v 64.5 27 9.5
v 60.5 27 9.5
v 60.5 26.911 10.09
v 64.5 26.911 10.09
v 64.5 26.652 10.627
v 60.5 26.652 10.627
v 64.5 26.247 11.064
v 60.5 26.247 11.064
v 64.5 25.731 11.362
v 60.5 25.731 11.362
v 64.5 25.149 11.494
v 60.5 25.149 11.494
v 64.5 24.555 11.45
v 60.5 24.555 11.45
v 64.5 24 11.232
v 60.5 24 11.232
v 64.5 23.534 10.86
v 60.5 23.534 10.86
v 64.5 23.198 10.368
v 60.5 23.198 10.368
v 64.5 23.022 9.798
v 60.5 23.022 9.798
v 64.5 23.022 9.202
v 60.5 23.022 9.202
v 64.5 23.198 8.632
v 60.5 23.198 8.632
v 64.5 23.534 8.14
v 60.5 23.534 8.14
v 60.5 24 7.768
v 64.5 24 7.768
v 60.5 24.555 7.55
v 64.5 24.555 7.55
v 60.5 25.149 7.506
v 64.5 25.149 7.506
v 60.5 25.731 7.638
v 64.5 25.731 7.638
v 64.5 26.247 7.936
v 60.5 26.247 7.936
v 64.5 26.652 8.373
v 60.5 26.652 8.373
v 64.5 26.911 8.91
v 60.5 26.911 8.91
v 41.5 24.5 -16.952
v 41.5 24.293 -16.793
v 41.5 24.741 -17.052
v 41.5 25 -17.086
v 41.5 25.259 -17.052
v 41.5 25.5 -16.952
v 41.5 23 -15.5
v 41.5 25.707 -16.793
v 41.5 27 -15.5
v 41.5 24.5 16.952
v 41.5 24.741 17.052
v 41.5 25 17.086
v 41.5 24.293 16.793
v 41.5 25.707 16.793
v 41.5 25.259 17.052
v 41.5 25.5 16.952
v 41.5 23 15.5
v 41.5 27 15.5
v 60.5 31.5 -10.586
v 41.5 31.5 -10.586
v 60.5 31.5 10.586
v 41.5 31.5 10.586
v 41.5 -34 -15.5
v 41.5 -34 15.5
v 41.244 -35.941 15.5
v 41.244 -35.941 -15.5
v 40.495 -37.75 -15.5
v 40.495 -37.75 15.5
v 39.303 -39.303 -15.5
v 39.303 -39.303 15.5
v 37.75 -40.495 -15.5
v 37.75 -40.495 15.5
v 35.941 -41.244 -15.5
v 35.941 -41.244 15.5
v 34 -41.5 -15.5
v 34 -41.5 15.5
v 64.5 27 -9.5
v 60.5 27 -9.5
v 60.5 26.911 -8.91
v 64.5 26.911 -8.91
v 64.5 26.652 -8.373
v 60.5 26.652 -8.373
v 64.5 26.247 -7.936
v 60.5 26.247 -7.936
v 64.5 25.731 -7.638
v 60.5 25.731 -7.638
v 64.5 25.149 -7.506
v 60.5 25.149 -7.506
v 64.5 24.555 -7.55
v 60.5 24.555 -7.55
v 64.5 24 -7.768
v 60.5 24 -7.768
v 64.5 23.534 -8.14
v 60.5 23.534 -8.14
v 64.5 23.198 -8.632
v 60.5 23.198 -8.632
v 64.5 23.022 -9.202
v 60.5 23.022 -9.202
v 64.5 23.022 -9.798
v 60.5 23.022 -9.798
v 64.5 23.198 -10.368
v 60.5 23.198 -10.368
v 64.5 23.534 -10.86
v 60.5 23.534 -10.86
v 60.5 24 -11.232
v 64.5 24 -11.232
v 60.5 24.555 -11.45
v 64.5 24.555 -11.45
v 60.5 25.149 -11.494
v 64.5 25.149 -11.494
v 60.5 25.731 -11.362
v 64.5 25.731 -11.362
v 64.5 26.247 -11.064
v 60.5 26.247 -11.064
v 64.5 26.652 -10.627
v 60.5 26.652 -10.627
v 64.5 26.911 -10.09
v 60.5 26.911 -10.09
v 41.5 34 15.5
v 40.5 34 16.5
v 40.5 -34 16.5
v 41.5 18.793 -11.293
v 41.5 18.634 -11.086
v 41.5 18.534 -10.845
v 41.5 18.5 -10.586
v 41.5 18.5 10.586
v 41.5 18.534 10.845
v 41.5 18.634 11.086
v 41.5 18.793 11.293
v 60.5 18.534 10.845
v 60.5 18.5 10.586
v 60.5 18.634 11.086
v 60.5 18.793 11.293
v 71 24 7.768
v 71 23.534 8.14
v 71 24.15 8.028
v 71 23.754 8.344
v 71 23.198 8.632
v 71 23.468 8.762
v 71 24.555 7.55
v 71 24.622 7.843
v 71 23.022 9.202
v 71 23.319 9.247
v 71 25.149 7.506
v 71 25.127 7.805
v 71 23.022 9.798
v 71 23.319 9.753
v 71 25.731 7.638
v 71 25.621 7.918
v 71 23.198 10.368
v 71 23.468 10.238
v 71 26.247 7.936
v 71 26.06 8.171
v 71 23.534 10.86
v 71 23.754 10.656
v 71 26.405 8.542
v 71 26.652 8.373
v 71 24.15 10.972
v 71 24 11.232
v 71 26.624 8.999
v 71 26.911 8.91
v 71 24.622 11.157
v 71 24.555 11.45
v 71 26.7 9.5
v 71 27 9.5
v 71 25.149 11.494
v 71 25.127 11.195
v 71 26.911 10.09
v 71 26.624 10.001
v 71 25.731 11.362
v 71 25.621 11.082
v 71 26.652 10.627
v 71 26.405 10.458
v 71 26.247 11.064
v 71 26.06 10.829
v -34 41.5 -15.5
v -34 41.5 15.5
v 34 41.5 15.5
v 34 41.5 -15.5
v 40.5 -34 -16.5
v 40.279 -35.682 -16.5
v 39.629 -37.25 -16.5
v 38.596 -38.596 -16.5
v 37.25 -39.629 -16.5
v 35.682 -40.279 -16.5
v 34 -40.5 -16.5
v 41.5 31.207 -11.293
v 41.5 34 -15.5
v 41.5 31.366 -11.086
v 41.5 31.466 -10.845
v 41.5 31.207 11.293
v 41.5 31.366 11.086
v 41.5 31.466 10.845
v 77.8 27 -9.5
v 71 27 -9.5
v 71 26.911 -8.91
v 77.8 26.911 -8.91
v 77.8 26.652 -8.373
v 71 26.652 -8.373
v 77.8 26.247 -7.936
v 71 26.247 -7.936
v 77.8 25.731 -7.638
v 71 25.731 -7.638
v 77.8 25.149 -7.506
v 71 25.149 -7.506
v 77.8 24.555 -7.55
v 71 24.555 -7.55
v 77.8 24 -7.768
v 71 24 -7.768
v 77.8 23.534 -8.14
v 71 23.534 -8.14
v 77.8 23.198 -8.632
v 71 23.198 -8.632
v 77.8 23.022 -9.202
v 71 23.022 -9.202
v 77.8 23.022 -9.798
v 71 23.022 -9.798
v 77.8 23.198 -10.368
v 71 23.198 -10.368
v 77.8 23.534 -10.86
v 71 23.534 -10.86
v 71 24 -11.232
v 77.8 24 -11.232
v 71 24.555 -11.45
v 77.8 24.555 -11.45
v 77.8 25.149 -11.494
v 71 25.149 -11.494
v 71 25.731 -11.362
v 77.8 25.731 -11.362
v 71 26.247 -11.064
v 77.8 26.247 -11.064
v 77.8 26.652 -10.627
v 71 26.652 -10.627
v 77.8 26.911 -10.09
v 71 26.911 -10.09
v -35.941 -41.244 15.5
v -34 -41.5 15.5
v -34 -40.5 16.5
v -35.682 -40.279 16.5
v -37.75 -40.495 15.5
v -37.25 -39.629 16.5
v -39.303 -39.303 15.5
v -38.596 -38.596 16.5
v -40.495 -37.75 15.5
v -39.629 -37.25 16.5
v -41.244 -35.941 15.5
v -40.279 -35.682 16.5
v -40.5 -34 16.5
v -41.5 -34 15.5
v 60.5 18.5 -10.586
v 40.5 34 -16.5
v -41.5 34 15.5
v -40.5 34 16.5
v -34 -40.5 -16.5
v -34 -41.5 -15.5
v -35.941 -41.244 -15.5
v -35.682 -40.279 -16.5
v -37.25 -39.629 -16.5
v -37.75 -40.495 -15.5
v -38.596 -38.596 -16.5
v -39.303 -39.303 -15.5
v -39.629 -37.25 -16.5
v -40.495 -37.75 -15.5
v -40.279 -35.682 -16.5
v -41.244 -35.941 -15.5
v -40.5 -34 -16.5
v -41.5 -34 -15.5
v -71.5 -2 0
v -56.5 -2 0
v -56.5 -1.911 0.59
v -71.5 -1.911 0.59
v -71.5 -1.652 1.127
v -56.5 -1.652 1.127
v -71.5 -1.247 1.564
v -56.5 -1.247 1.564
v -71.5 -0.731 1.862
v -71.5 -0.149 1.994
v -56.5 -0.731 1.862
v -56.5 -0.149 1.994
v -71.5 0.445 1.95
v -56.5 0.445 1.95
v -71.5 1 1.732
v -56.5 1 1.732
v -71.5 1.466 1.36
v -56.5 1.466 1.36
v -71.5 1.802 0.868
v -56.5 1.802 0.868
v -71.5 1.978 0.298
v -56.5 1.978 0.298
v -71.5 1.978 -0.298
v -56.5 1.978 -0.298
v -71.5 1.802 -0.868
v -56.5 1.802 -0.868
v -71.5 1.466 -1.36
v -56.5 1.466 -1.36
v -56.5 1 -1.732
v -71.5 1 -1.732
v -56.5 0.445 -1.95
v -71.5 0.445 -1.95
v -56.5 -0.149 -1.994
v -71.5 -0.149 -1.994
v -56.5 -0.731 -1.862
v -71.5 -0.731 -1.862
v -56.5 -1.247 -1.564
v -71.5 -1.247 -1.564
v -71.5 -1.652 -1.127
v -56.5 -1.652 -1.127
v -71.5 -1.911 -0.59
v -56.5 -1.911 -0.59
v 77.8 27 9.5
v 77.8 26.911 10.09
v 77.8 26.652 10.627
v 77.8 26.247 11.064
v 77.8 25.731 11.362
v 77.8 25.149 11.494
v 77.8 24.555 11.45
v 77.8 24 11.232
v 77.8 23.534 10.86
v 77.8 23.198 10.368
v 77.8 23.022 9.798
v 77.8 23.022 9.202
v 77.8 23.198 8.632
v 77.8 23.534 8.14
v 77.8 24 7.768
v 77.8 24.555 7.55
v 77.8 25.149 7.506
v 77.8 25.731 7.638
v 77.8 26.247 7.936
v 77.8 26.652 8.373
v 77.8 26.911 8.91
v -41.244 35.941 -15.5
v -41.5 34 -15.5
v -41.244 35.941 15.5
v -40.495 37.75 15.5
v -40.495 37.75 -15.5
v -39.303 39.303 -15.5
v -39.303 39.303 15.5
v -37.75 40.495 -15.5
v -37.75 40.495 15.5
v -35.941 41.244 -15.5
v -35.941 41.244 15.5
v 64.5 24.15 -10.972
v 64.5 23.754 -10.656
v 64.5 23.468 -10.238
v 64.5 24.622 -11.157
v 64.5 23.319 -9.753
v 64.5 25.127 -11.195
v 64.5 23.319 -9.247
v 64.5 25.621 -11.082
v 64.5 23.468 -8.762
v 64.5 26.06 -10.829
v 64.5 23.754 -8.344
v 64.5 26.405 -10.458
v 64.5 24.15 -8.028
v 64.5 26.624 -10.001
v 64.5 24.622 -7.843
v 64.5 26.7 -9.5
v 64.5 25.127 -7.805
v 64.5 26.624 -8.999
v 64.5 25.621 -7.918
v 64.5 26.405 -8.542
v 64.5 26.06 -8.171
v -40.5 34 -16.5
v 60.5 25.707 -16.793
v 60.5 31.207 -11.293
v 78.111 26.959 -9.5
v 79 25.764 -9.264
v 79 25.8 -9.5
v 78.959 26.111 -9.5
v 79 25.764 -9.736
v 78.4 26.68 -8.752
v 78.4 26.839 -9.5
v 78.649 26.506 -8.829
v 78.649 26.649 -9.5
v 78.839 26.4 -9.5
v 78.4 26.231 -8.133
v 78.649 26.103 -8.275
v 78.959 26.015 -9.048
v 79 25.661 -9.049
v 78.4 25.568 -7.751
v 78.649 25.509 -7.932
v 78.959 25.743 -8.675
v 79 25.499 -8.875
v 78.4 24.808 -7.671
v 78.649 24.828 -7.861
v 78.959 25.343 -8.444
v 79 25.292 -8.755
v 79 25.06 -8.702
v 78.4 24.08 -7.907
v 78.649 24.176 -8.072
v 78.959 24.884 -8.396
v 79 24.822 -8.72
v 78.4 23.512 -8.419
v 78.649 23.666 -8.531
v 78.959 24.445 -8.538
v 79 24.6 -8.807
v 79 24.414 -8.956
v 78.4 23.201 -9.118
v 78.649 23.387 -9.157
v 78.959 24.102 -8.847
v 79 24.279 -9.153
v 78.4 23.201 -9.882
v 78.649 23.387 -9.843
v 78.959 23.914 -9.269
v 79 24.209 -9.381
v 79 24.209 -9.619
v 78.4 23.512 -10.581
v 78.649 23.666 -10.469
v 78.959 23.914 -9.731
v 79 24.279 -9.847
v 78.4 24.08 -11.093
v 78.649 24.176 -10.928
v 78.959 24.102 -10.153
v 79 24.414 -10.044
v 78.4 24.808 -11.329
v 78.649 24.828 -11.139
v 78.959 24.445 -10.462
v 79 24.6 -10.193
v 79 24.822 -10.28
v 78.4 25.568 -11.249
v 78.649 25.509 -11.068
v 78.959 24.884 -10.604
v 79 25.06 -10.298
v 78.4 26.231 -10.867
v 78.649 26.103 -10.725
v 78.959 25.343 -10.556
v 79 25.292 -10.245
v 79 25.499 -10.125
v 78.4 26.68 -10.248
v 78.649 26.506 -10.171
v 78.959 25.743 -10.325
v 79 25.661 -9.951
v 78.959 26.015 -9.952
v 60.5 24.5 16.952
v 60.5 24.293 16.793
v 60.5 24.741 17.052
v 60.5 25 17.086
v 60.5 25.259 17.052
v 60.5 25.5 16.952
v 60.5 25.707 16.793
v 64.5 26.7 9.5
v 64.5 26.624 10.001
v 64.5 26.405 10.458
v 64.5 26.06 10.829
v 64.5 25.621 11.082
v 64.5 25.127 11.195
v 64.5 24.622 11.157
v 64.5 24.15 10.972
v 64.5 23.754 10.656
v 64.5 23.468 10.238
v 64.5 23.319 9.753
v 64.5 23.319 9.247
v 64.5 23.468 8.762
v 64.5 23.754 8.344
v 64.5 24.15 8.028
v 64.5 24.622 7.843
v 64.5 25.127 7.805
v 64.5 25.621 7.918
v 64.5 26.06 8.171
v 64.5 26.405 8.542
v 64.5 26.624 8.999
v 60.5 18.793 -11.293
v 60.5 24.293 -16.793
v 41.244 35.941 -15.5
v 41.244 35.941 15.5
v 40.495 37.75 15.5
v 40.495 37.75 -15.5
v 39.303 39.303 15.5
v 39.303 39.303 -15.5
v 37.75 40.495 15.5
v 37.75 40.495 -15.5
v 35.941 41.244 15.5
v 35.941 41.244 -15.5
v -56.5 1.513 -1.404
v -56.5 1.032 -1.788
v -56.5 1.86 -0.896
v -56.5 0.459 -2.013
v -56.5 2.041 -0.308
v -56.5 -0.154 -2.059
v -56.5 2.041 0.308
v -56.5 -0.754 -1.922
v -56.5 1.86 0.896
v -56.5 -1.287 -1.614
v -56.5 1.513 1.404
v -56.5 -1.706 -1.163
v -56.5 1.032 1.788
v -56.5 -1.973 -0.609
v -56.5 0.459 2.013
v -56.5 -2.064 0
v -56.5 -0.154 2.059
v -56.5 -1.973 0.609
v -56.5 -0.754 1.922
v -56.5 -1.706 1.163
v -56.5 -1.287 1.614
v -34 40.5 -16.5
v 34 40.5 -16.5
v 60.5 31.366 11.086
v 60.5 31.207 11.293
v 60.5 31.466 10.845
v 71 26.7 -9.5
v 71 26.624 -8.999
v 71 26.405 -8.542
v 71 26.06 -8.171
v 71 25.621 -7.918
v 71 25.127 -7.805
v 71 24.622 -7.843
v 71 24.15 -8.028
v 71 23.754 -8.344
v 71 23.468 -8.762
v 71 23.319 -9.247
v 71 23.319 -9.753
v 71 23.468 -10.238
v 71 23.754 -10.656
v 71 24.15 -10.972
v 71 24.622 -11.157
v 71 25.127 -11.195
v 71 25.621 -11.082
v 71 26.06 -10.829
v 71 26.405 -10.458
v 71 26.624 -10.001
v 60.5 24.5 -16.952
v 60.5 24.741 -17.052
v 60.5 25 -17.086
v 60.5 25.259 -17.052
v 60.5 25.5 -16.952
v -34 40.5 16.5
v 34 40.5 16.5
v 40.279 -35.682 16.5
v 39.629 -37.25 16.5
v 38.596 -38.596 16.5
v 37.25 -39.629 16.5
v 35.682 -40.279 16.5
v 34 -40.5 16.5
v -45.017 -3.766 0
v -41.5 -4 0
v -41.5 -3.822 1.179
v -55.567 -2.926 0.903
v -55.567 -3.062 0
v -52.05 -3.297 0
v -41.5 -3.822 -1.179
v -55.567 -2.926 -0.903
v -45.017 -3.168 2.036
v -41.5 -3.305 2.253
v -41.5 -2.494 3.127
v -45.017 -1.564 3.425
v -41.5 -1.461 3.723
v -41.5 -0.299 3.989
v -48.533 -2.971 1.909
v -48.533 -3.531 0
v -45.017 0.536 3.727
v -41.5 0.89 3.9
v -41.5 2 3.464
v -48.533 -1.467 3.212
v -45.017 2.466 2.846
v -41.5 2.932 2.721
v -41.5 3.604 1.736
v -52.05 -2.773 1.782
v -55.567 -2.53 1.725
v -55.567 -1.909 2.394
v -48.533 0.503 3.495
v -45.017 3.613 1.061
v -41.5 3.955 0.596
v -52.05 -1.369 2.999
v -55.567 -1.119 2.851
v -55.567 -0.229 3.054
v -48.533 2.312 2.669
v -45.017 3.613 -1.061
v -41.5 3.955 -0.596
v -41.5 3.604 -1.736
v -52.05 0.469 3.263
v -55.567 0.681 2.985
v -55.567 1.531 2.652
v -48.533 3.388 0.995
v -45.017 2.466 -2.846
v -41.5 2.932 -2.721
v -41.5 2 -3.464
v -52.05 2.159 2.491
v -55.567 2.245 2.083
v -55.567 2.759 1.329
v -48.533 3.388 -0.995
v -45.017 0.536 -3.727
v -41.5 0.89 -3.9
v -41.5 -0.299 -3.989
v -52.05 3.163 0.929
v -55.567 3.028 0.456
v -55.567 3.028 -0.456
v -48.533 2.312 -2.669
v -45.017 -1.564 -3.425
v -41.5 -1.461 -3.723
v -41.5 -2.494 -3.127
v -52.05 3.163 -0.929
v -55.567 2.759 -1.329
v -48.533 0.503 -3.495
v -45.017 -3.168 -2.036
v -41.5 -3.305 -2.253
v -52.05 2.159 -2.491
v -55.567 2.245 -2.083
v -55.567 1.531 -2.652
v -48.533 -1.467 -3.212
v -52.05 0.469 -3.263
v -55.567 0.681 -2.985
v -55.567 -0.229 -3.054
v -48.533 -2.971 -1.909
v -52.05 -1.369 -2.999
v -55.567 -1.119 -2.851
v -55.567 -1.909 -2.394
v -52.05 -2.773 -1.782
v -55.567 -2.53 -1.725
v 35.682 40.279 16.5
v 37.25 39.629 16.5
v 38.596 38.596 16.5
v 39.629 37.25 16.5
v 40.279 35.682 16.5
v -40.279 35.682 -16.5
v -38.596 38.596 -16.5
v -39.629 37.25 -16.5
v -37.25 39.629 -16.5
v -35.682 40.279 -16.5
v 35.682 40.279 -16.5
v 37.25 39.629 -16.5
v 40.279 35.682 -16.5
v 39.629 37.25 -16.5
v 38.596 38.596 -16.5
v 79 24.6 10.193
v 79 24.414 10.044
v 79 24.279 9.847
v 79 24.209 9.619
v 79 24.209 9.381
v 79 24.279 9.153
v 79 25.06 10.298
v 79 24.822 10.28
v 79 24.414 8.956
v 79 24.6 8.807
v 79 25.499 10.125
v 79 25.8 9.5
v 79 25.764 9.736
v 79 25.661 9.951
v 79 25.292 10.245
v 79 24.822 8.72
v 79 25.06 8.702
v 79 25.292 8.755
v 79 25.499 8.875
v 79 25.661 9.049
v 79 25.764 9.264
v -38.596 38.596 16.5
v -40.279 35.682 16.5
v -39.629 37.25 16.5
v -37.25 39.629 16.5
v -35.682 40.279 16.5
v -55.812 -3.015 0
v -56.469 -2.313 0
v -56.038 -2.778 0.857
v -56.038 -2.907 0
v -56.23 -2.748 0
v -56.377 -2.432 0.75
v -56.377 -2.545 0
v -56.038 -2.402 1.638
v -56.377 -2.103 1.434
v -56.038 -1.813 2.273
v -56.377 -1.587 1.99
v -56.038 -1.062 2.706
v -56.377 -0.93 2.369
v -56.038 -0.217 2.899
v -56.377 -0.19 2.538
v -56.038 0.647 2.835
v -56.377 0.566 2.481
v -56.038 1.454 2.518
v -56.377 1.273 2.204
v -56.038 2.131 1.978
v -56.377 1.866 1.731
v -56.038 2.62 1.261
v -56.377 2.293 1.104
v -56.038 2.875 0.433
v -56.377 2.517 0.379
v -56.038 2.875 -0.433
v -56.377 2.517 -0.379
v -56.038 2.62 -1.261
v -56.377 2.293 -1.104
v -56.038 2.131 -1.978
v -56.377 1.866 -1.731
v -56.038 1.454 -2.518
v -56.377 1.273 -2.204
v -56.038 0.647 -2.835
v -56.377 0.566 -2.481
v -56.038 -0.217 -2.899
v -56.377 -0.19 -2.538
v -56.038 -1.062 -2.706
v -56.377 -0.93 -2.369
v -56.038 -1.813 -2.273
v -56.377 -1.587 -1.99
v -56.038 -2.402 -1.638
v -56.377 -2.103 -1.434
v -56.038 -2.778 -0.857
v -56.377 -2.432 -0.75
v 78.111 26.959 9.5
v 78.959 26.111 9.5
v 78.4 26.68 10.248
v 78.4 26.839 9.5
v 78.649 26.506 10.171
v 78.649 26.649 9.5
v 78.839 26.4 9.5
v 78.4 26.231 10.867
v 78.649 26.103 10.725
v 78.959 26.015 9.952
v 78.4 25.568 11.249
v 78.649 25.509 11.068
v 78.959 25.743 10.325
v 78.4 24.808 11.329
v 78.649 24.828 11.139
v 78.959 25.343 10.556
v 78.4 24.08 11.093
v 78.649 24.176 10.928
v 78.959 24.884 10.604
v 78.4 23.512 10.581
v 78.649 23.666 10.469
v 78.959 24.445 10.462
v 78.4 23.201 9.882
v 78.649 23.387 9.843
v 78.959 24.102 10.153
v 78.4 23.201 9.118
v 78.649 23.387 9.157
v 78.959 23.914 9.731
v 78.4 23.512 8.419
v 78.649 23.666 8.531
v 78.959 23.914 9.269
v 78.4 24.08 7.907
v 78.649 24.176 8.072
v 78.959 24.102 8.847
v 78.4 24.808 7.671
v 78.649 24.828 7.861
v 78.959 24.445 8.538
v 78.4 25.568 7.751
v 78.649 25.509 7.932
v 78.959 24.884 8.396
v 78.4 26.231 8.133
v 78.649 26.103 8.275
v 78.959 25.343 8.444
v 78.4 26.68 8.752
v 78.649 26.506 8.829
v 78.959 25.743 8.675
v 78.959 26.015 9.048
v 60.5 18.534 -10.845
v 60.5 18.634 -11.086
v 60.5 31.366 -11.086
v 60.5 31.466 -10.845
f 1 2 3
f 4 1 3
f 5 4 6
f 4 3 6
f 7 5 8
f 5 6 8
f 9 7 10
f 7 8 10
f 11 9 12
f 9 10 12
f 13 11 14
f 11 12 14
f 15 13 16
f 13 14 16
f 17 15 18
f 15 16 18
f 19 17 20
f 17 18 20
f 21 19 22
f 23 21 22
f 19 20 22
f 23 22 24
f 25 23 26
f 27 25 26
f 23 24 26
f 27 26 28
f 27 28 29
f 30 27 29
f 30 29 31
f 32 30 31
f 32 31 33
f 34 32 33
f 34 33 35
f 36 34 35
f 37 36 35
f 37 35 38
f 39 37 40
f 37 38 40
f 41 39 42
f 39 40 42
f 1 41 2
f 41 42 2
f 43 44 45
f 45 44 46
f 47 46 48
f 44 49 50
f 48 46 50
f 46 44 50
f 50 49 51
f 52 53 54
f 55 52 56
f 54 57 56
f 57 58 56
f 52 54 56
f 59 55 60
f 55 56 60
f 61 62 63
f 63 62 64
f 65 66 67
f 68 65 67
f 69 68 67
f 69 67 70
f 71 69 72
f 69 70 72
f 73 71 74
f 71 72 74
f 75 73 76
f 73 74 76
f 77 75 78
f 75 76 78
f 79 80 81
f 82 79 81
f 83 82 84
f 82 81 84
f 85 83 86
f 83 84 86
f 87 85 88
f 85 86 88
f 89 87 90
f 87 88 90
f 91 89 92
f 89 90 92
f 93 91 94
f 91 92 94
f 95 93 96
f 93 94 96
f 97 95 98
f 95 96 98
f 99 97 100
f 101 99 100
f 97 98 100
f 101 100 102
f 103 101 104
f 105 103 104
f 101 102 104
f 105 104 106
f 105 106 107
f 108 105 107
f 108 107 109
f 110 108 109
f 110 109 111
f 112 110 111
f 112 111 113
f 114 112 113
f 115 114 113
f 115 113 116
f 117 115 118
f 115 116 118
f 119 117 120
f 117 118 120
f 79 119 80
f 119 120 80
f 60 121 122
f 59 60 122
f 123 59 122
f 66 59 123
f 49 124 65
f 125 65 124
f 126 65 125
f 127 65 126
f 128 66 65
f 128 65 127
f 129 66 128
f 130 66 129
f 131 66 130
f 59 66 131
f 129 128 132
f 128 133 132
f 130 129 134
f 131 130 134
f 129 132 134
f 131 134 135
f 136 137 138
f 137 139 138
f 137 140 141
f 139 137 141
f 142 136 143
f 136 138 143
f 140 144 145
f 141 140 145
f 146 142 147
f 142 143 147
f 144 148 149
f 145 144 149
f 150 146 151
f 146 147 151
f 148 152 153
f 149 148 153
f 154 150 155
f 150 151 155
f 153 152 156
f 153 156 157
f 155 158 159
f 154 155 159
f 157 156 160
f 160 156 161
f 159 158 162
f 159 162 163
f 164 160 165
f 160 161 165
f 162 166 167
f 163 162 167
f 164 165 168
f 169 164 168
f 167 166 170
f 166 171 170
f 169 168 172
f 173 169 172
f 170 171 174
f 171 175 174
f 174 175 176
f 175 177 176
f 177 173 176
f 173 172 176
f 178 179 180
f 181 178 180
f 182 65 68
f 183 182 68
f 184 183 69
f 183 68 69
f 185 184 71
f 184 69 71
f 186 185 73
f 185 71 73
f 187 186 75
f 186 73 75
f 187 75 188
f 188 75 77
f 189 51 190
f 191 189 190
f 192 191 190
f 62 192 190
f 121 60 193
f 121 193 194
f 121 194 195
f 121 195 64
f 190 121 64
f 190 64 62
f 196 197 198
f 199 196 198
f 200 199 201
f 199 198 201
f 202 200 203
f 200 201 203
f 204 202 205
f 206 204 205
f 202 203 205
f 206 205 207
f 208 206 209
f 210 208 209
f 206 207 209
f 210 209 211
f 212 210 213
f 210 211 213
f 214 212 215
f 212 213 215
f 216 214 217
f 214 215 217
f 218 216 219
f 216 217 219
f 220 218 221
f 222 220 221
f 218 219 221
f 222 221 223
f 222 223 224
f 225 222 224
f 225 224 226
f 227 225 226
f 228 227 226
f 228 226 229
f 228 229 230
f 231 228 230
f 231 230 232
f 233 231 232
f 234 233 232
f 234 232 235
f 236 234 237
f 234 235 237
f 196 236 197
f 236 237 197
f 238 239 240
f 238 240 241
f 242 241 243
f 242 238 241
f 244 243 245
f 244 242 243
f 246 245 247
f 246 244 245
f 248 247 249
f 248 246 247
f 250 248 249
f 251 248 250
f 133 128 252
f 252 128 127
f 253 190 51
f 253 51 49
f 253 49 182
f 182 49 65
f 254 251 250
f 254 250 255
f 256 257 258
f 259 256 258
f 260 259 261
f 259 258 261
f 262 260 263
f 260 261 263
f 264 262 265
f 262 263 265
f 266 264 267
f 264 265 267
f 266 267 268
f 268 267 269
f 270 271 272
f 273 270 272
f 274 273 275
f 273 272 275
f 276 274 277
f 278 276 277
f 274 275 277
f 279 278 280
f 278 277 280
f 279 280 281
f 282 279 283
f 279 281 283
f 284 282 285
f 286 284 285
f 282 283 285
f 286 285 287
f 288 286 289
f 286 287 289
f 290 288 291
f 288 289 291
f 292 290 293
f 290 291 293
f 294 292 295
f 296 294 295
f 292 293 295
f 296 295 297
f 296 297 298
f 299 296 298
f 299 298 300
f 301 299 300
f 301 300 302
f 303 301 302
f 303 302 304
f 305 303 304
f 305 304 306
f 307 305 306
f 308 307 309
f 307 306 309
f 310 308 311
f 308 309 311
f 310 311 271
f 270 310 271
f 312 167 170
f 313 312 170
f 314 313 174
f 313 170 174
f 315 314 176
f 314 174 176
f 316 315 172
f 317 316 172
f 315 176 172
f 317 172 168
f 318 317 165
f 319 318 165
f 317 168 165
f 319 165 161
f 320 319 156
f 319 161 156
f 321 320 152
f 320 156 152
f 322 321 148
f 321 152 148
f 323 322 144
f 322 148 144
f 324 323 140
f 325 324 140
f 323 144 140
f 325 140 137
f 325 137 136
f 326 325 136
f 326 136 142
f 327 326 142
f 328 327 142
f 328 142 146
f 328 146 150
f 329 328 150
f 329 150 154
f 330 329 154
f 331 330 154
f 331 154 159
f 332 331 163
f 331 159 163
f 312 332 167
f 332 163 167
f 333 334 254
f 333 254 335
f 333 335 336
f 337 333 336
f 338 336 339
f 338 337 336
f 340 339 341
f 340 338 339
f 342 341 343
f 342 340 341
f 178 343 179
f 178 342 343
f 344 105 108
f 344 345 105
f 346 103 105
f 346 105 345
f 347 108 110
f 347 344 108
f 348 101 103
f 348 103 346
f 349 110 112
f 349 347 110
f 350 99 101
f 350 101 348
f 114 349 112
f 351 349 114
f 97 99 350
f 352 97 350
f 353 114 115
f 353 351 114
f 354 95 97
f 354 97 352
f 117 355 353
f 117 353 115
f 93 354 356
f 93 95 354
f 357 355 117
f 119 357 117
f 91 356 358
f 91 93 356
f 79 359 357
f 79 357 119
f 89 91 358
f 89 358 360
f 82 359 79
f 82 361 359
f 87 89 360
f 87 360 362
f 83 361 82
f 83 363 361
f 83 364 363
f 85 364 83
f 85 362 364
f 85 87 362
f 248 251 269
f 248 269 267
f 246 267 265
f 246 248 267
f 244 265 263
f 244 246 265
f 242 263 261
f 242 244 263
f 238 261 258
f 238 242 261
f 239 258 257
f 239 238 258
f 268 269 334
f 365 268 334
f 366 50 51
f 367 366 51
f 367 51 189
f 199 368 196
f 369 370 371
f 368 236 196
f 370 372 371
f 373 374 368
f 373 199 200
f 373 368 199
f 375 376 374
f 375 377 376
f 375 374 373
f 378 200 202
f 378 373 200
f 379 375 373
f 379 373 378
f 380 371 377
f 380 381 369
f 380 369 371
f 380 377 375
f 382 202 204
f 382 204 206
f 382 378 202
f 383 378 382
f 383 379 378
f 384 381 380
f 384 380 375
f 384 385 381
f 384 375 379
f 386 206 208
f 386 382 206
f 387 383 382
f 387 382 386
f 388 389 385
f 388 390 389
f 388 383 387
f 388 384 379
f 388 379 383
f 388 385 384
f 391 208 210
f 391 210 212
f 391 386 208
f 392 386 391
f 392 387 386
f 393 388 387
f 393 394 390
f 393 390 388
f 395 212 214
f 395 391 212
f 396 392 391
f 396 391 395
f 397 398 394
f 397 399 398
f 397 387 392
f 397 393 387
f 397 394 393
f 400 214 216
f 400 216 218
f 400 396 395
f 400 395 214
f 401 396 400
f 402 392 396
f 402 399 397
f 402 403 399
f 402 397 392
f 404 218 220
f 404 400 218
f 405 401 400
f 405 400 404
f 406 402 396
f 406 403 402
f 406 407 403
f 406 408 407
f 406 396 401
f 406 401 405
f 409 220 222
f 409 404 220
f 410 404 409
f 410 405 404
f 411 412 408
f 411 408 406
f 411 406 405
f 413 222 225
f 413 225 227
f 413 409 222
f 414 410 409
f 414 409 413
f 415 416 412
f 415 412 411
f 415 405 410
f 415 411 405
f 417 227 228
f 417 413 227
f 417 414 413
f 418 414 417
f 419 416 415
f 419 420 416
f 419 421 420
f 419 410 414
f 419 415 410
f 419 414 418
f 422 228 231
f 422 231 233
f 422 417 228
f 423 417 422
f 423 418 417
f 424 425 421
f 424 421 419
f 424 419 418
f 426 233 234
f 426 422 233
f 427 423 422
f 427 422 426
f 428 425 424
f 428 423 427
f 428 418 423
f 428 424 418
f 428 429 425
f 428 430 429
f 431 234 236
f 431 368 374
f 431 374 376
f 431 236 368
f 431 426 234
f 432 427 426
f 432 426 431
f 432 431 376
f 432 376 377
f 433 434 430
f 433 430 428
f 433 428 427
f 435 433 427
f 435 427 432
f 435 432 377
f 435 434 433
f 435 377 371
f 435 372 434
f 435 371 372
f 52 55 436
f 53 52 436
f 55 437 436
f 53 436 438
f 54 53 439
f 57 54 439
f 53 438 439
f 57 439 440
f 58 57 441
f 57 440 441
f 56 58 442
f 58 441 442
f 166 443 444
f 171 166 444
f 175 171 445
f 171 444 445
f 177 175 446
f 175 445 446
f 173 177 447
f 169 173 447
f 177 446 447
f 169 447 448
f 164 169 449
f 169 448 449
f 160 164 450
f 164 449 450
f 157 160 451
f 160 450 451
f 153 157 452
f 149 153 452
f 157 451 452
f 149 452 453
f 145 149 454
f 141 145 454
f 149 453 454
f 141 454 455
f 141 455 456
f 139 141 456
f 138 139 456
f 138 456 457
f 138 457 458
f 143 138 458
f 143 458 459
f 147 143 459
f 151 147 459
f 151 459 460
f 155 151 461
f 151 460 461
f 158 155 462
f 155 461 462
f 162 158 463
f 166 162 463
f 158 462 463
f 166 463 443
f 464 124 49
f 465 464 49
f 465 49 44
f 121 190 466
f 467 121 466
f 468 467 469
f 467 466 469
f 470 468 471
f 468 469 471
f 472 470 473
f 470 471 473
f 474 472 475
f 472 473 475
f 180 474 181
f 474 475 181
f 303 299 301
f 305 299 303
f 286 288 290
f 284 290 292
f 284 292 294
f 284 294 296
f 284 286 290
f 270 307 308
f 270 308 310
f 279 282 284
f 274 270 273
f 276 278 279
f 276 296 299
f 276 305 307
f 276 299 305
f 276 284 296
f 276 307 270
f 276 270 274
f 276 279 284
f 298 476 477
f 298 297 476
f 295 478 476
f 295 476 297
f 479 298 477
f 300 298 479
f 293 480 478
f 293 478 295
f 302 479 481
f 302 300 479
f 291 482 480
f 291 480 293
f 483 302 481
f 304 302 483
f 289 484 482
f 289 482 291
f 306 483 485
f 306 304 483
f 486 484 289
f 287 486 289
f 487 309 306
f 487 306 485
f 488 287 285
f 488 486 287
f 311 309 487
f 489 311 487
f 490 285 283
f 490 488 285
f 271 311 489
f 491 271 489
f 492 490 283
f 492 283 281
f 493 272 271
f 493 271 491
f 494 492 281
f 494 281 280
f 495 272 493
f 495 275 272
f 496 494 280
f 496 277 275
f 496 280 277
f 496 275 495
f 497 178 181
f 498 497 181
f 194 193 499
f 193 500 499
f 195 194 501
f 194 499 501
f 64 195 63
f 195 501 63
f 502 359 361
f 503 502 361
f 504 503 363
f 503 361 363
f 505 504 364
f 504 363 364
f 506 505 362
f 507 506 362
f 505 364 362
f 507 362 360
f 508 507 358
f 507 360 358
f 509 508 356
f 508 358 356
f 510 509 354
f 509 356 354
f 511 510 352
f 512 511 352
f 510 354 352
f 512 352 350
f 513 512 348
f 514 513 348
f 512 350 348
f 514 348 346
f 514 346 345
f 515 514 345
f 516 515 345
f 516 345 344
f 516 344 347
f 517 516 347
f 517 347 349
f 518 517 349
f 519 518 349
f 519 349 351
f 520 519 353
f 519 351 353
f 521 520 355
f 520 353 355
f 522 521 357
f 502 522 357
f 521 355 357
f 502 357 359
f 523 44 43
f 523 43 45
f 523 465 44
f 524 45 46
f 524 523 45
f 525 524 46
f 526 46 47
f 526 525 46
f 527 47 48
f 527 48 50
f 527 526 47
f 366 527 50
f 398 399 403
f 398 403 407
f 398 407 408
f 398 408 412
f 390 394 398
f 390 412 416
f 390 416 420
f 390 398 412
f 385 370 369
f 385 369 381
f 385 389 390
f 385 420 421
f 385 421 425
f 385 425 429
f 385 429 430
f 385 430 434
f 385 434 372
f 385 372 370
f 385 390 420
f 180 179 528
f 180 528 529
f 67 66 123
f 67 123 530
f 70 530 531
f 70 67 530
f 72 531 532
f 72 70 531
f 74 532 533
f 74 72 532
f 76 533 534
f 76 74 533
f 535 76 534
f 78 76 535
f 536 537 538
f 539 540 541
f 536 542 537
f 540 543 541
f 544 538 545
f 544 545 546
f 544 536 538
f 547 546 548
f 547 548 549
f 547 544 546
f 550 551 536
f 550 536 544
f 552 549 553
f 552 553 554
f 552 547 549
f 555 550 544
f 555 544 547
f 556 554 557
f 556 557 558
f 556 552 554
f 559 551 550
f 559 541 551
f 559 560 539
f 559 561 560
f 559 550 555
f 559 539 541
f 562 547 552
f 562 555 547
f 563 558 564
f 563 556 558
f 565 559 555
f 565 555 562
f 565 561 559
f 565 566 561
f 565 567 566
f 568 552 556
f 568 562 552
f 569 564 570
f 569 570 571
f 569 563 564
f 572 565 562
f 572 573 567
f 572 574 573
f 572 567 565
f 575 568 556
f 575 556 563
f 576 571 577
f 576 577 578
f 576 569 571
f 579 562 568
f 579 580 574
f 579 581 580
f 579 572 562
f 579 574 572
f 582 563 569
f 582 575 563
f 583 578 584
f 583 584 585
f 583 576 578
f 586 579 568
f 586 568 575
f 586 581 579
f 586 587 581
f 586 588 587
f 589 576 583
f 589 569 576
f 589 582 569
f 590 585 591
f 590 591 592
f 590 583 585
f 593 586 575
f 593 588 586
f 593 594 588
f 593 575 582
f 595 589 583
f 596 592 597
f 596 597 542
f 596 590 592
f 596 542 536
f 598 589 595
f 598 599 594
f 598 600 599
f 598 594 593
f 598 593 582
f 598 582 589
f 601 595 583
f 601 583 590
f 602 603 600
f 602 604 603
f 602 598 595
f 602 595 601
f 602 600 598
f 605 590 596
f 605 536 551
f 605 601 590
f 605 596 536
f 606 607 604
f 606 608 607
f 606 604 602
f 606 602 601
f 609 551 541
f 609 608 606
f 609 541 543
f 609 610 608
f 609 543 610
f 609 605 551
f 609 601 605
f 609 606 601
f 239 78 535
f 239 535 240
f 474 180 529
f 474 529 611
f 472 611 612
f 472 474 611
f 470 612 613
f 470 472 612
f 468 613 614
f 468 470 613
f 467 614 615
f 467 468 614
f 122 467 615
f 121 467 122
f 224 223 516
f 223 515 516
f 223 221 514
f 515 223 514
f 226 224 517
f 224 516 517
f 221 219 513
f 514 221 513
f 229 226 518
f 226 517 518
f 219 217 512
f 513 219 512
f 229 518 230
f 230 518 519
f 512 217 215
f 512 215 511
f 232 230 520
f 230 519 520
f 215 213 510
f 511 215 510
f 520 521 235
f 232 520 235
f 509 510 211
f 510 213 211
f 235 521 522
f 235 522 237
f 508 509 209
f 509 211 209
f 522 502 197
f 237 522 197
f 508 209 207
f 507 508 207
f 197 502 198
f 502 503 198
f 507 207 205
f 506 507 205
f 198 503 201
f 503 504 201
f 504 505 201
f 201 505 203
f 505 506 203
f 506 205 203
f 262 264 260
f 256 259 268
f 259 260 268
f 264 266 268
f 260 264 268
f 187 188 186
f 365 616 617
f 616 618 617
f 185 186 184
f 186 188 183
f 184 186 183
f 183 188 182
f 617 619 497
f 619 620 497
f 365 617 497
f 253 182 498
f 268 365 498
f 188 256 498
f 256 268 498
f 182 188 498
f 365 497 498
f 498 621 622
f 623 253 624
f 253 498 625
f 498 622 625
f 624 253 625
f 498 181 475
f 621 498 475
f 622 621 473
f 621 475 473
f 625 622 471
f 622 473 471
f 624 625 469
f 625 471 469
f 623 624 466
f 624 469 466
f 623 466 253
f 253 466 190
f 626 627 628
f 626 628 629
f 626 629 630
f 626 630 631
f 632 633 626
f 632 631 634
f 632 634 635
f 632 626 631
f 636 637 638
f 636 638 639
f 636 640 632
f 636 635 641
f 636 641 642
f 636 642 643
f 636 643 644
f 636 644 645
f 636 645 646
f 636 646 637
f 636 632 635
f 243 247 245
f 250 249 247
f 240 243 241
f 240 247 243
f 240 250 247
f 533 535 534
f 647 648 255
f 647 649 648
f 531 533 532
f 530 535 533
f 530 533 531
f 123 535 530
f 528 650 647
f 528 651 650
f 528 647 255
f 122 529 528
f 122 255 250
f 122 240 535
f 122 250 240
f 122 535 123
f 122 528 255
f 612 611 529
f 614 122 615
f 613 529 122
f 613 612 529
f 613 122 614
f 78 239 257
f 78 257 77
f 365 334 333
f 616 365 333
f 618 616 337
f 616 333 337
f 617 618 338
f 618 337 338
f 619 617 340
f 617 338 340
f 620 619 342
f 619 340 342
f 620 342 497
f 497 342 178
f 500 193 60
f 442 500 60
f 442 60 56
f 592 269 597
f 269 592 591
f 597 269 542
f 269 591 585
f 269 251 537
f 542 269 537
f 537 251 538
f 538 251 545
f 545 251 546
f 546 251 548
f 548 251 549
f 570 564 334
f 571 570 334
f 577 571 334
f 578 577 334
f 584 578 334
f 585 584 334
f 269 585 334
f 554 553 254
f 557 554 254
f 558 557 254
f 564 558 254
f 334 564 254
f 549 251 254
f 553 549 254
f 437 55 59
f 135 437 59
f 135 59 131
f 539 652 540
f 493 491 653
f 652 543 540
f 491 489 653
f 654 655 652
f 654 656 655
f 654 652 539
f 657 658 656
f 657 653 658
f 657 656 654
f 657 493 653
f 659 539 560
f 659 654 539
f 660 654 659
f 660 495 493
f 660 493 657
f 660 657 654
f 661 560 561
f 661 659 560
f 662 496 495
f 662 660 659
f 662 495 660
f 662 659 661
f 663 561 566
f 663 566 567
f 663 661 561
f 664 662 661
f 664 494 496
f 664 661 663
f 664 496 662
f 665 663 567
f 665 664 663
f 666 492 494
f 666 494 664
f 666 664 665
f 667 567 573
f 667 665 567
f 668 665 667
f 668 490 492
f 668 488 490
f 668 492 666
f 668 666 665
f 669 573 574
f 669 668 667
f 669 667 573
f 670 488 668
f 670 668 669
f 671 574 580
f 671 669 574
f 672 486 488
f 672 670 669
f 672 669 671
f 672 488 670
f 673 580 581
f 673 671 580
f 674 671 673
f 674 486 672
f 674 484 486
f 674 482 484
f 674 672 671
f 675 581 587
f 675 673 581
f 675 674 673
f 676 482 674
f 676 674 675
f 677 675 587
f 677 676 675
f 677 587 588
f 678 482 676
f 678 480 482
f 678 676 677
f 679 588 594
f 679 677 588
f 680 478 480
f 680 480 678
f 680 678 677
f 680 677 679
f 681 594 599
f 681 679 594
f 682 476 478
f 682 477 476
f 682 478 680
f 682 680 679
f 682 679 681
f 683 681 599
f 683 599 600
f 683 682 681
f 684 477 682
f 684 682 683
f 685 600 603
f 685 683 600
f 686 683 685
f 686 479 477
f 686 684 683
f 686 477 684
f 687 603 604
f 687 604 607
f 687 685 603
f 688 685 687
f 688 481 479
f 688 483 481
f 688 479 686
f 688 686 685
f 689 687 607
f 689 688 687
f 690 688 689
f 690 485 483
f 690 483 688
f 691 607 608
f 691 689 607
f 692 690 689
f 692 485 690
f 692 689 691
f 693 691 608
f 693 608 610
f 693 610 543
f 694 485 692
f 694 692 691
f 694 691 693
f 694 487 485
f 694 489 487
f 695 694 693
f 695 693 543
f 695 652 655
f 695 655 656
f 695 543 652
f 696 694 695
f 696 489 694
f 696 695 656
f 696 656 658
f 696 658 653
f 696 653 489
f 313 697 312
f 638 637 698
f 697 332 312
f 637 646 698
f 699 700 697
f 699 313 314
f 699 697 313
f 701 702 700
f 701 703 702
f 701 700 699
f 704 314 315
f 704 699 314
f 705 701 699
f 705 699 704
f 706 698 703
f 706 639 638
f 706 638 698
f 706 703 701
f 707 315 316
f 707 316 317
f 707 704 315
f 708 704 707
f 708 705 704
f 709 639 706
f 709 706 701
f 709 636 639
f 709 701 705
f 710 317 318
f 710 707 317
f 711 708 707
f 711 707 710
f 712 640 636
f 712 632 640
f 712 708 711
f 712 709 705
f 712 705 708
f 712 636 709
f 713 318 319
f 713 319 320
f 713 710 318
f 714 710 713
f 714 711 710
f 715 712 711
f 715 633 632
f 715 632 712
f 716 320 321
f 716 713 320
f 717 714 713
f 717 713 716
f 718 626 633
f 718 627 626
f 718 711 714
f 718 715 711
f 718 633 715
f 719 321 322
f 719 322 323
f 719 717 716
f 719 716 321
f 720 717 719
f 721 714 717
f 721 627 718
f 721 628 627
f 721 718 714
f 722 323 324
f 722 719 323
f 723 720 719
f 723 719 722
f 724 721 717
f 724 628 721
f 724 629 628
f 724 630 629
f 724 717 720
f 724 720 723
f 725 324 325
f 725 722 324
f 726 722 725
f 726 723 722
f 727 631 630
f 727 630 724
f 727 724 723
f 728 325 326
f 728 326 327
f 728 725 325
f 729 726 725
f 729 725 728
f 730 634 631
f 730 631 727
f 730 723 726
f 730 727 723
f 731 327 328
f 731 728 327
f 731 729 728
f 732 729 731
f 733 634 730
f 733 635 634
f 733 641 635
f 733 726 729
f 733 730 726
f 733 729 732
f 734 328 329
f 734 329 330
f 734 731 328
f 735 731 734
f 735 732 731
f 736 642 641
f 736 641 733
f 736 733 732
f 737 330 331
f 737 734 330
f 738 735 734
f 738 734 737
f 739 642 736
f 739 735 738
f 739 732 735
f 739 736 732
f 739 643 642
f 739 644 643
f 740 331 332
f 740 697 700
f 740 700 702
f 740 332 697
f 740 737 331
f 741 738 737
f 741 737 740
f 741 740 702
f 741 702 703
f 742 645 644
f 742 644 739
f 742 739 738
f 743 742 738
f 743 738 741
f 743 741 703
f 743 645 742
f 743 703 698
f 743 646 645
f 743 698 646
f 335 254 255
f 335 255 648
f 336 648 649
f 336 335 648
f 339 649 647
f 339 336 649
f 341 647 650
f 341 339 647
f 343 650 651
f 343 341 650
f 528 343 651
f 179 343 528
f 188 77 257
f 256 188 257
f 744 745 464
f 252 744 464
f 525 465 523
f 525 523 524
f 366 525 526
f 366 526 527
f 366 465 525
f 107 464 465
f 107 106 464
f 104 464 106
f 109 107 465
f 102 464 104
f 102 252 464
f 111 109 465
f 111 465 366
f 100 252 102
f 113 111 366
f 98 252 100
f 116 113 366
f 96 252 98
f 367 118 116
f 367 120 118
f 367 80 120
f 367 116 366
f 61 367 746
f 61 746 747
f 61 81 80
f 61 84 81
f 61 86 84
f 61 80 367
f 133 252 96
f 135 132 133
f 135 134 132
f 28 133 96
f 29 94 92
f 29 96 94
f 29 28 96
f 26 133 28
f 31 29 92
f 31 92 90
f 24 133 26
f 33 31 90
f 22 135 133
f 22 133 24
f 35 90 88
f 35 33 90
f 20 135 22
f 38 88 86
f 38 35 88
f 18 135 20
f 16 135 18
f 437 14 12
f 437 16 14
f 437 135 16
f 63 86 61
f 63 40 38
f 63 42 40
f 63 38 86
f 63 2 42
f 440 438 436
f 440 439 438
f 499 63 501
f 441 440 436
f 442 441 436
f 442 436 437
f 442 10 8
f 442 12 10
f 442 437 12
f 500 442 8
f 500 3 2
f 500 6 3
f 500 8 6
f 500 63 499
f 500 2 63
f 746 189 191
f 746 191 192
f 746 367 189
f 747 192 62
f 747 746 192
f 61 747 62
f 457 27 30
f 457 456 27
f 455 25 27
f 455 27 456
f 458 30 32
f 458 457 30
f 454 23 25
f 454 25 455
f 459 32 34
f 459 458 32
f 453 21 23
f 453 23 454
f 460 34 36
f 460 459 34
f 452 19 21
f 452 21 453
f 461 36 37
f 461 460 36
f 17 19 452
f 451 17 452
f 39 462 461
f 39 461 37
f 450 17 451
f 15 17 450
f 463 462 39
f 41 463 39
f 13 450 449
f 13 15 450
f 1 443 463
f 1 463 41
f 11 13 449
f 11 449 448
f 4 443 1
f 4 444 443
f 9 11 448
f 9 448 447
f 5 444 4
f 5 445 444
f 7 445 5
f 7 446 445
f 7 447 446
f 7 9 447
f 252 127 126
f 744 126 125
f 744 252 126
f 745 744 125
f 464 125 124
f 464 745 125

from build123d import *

# Parameters (mm, degrees)
SKETCH_W     = 83
SKETCH_H     = 83
PAD_DEPTH    = 16.5
FILLET_R     = 7.5
CHAMFER_SIZE = 1
PAD001_DEPTH = 19
FILLET001_R  = 1
SKETCH002_R  = 2
PAD002_DEPTH = 4
SKETCH003_R  = 1.7
PAD003_DEPTH = 6.5
SKETCH004_R  = 2
PAD004_DEPTH = 8
FILLET002_R  = 1.2
FILLET003_R  = 1.2
FILLET004_R  = 1
SKETCH005_R  = 2
PAD005_DEPTH = 15


with BuildPart() as part:
    # Sketch → Pad (new body, symmetric)
    with BuildSketch(Plane.XY):
        Rectangle(SKETCH_W, SKETCH_H)
    extrude(amount=PAD_DEPTH, both=True)

    # Fillet
    fillet_edges = [part.edges().sort_by_distance(p)[0] for p in [
        (41.5, -41.5, 0),
        (-41.5, -41.5, 0),
        (41.5, 41.5, 0),
        (-41.5, 41.5, 0),
    ]]
    fillet(fillet_edges, radius=FILLET_R)

    # Chamfer
    chamfer_edges = [part.edges().sort_by_distance(p)[0] for p in [
        (0, 41.5, 16.5),
        (-39.303301, 39.303301, 16.5),
        (-41.5, 0, 16.5),
        (41.5, 0, 16.5),
        (39.303301, 39.303301, 16.5),
        (-39.303301, -39.303301, 16.5),
        (0, -41.5, 16.5),
        (39.303301, -39.303301, 16.5),
        (39.303301, -39.303301, -16.5),
        (0, -41.5, -16.5),
        (-39.303301, -39.303301, -16.5),
        (-41.5, 0, -16.5),
        (41.5, 0, -16.5),
        (39.303301, 39.303301, -16.5),
        (0, 41.5, -16.5),
        (-39.303301, 39.303301, -16.5),
    ]]
    chamfer(chamfer_edges, length=CHAMFER_SIZE)

    # Sketch001 (on Face13 of Chamfer) → Pad001 (join)
    with BuildSketch(Plane.YZ.offset(41.5)):
        Polygon((18.5, 11), (18.5, -11), (25, -17.5), (31.5, -11), (31.5, 11), (25, 17.5), align=None)
    extrude(amount=PAD001_DEPTH)

    # Fillet001
    fillet001_edges = [part.edges().sort_by_distance(p)[0] for p in [
        (51, 31.5, 11),
        (51, 18.5, 11),
        (51, 25, 17.5),
        (51, 18.5, -11),
        (51, 25, -17.5),
        (51, 31.5, -11),
    ]]
    fillet(fillet001_edges, radius=FILLET001_R)

    # Sketch002 (on Face12 of Fillet001) → Pad002 (join)
    with BuildSketch(Plane.YZ.offset(60.5)):
        with Locations((25, 9.5)):
            Circle(SKETCH002_R)
        with Locations((25, -9.5)):
            Circle(SKETCH002_R)
    extrude(amount=PAD002_DEPTH)

    # Sketch003 (on Face43 of Pad002) → Pad003 (join)
    with BuildSketch(Plane.YZ.offset(64.5)):
        with Locations((25, 9.5)):
            Circle(SKETCH003_R)
        with Locations((25, -9.5)):
            Circle(SKETCH003_R)
    extrude(amount=PAD003_DEPTH)

    # Sketch004 (on Face50 of Pad003) → Pad004 (join)
    with BuildSketch(Plane.YZ.offset(71)):
        with Locations((25, 9.5)):
            Circle(SKETCH004_R)
        with Locations((25, -9.5)):
            Circle(SKETCH004_R)
    extrude(amount=PAD004_DEPTH)

    # Fillet002
    fillet002_edges = [part.edges().sort_by_distance(p)[0] for p in [
        (79, 23, 9.5),
    ]]
    fillet(fillet002_edges, radius=FILLET002_R)

    # Fillet003
    fillet003_edges = [part.edges().sort_by_distance(p)[0] for p in [
        (79, 23, -9.5),
    ]]
    fillet(fillet003_edges, radius=FILLET003_R)

    # Cone → Cone (revolve)
    with BuildSketch(Plane(origin=(-41.5, 0, 0), x_dir=(0, -1, 0), z_dir=(0, 0, -1))):
        Polygon((0, 0), (4, 0), (3, 15), (0, 15), align=None)
    revolve(axis=Axis((-41.5, 0, 0), (-1, 0, 0)))

    # Fillet004
    fillet004_edges = [part.edges().sort_by_distance(p)[0] for p in [
        (-56.5, 3, 0),
    ]]
    fillet(fillet004_edges, radius=FILLET004_R)

    # Sketch005 (on Face4 of Fillet004) → Pad005 (join)
    with BuildSketch(Plane(origin=(-56.5, 0, 0), x_dir=(0, -1, 0), z_dir=(-1, 0, 0))):
        Circle(SKETCH005_R)
    extrude(amount=PAD005_DEPTH)


solid = part.part
